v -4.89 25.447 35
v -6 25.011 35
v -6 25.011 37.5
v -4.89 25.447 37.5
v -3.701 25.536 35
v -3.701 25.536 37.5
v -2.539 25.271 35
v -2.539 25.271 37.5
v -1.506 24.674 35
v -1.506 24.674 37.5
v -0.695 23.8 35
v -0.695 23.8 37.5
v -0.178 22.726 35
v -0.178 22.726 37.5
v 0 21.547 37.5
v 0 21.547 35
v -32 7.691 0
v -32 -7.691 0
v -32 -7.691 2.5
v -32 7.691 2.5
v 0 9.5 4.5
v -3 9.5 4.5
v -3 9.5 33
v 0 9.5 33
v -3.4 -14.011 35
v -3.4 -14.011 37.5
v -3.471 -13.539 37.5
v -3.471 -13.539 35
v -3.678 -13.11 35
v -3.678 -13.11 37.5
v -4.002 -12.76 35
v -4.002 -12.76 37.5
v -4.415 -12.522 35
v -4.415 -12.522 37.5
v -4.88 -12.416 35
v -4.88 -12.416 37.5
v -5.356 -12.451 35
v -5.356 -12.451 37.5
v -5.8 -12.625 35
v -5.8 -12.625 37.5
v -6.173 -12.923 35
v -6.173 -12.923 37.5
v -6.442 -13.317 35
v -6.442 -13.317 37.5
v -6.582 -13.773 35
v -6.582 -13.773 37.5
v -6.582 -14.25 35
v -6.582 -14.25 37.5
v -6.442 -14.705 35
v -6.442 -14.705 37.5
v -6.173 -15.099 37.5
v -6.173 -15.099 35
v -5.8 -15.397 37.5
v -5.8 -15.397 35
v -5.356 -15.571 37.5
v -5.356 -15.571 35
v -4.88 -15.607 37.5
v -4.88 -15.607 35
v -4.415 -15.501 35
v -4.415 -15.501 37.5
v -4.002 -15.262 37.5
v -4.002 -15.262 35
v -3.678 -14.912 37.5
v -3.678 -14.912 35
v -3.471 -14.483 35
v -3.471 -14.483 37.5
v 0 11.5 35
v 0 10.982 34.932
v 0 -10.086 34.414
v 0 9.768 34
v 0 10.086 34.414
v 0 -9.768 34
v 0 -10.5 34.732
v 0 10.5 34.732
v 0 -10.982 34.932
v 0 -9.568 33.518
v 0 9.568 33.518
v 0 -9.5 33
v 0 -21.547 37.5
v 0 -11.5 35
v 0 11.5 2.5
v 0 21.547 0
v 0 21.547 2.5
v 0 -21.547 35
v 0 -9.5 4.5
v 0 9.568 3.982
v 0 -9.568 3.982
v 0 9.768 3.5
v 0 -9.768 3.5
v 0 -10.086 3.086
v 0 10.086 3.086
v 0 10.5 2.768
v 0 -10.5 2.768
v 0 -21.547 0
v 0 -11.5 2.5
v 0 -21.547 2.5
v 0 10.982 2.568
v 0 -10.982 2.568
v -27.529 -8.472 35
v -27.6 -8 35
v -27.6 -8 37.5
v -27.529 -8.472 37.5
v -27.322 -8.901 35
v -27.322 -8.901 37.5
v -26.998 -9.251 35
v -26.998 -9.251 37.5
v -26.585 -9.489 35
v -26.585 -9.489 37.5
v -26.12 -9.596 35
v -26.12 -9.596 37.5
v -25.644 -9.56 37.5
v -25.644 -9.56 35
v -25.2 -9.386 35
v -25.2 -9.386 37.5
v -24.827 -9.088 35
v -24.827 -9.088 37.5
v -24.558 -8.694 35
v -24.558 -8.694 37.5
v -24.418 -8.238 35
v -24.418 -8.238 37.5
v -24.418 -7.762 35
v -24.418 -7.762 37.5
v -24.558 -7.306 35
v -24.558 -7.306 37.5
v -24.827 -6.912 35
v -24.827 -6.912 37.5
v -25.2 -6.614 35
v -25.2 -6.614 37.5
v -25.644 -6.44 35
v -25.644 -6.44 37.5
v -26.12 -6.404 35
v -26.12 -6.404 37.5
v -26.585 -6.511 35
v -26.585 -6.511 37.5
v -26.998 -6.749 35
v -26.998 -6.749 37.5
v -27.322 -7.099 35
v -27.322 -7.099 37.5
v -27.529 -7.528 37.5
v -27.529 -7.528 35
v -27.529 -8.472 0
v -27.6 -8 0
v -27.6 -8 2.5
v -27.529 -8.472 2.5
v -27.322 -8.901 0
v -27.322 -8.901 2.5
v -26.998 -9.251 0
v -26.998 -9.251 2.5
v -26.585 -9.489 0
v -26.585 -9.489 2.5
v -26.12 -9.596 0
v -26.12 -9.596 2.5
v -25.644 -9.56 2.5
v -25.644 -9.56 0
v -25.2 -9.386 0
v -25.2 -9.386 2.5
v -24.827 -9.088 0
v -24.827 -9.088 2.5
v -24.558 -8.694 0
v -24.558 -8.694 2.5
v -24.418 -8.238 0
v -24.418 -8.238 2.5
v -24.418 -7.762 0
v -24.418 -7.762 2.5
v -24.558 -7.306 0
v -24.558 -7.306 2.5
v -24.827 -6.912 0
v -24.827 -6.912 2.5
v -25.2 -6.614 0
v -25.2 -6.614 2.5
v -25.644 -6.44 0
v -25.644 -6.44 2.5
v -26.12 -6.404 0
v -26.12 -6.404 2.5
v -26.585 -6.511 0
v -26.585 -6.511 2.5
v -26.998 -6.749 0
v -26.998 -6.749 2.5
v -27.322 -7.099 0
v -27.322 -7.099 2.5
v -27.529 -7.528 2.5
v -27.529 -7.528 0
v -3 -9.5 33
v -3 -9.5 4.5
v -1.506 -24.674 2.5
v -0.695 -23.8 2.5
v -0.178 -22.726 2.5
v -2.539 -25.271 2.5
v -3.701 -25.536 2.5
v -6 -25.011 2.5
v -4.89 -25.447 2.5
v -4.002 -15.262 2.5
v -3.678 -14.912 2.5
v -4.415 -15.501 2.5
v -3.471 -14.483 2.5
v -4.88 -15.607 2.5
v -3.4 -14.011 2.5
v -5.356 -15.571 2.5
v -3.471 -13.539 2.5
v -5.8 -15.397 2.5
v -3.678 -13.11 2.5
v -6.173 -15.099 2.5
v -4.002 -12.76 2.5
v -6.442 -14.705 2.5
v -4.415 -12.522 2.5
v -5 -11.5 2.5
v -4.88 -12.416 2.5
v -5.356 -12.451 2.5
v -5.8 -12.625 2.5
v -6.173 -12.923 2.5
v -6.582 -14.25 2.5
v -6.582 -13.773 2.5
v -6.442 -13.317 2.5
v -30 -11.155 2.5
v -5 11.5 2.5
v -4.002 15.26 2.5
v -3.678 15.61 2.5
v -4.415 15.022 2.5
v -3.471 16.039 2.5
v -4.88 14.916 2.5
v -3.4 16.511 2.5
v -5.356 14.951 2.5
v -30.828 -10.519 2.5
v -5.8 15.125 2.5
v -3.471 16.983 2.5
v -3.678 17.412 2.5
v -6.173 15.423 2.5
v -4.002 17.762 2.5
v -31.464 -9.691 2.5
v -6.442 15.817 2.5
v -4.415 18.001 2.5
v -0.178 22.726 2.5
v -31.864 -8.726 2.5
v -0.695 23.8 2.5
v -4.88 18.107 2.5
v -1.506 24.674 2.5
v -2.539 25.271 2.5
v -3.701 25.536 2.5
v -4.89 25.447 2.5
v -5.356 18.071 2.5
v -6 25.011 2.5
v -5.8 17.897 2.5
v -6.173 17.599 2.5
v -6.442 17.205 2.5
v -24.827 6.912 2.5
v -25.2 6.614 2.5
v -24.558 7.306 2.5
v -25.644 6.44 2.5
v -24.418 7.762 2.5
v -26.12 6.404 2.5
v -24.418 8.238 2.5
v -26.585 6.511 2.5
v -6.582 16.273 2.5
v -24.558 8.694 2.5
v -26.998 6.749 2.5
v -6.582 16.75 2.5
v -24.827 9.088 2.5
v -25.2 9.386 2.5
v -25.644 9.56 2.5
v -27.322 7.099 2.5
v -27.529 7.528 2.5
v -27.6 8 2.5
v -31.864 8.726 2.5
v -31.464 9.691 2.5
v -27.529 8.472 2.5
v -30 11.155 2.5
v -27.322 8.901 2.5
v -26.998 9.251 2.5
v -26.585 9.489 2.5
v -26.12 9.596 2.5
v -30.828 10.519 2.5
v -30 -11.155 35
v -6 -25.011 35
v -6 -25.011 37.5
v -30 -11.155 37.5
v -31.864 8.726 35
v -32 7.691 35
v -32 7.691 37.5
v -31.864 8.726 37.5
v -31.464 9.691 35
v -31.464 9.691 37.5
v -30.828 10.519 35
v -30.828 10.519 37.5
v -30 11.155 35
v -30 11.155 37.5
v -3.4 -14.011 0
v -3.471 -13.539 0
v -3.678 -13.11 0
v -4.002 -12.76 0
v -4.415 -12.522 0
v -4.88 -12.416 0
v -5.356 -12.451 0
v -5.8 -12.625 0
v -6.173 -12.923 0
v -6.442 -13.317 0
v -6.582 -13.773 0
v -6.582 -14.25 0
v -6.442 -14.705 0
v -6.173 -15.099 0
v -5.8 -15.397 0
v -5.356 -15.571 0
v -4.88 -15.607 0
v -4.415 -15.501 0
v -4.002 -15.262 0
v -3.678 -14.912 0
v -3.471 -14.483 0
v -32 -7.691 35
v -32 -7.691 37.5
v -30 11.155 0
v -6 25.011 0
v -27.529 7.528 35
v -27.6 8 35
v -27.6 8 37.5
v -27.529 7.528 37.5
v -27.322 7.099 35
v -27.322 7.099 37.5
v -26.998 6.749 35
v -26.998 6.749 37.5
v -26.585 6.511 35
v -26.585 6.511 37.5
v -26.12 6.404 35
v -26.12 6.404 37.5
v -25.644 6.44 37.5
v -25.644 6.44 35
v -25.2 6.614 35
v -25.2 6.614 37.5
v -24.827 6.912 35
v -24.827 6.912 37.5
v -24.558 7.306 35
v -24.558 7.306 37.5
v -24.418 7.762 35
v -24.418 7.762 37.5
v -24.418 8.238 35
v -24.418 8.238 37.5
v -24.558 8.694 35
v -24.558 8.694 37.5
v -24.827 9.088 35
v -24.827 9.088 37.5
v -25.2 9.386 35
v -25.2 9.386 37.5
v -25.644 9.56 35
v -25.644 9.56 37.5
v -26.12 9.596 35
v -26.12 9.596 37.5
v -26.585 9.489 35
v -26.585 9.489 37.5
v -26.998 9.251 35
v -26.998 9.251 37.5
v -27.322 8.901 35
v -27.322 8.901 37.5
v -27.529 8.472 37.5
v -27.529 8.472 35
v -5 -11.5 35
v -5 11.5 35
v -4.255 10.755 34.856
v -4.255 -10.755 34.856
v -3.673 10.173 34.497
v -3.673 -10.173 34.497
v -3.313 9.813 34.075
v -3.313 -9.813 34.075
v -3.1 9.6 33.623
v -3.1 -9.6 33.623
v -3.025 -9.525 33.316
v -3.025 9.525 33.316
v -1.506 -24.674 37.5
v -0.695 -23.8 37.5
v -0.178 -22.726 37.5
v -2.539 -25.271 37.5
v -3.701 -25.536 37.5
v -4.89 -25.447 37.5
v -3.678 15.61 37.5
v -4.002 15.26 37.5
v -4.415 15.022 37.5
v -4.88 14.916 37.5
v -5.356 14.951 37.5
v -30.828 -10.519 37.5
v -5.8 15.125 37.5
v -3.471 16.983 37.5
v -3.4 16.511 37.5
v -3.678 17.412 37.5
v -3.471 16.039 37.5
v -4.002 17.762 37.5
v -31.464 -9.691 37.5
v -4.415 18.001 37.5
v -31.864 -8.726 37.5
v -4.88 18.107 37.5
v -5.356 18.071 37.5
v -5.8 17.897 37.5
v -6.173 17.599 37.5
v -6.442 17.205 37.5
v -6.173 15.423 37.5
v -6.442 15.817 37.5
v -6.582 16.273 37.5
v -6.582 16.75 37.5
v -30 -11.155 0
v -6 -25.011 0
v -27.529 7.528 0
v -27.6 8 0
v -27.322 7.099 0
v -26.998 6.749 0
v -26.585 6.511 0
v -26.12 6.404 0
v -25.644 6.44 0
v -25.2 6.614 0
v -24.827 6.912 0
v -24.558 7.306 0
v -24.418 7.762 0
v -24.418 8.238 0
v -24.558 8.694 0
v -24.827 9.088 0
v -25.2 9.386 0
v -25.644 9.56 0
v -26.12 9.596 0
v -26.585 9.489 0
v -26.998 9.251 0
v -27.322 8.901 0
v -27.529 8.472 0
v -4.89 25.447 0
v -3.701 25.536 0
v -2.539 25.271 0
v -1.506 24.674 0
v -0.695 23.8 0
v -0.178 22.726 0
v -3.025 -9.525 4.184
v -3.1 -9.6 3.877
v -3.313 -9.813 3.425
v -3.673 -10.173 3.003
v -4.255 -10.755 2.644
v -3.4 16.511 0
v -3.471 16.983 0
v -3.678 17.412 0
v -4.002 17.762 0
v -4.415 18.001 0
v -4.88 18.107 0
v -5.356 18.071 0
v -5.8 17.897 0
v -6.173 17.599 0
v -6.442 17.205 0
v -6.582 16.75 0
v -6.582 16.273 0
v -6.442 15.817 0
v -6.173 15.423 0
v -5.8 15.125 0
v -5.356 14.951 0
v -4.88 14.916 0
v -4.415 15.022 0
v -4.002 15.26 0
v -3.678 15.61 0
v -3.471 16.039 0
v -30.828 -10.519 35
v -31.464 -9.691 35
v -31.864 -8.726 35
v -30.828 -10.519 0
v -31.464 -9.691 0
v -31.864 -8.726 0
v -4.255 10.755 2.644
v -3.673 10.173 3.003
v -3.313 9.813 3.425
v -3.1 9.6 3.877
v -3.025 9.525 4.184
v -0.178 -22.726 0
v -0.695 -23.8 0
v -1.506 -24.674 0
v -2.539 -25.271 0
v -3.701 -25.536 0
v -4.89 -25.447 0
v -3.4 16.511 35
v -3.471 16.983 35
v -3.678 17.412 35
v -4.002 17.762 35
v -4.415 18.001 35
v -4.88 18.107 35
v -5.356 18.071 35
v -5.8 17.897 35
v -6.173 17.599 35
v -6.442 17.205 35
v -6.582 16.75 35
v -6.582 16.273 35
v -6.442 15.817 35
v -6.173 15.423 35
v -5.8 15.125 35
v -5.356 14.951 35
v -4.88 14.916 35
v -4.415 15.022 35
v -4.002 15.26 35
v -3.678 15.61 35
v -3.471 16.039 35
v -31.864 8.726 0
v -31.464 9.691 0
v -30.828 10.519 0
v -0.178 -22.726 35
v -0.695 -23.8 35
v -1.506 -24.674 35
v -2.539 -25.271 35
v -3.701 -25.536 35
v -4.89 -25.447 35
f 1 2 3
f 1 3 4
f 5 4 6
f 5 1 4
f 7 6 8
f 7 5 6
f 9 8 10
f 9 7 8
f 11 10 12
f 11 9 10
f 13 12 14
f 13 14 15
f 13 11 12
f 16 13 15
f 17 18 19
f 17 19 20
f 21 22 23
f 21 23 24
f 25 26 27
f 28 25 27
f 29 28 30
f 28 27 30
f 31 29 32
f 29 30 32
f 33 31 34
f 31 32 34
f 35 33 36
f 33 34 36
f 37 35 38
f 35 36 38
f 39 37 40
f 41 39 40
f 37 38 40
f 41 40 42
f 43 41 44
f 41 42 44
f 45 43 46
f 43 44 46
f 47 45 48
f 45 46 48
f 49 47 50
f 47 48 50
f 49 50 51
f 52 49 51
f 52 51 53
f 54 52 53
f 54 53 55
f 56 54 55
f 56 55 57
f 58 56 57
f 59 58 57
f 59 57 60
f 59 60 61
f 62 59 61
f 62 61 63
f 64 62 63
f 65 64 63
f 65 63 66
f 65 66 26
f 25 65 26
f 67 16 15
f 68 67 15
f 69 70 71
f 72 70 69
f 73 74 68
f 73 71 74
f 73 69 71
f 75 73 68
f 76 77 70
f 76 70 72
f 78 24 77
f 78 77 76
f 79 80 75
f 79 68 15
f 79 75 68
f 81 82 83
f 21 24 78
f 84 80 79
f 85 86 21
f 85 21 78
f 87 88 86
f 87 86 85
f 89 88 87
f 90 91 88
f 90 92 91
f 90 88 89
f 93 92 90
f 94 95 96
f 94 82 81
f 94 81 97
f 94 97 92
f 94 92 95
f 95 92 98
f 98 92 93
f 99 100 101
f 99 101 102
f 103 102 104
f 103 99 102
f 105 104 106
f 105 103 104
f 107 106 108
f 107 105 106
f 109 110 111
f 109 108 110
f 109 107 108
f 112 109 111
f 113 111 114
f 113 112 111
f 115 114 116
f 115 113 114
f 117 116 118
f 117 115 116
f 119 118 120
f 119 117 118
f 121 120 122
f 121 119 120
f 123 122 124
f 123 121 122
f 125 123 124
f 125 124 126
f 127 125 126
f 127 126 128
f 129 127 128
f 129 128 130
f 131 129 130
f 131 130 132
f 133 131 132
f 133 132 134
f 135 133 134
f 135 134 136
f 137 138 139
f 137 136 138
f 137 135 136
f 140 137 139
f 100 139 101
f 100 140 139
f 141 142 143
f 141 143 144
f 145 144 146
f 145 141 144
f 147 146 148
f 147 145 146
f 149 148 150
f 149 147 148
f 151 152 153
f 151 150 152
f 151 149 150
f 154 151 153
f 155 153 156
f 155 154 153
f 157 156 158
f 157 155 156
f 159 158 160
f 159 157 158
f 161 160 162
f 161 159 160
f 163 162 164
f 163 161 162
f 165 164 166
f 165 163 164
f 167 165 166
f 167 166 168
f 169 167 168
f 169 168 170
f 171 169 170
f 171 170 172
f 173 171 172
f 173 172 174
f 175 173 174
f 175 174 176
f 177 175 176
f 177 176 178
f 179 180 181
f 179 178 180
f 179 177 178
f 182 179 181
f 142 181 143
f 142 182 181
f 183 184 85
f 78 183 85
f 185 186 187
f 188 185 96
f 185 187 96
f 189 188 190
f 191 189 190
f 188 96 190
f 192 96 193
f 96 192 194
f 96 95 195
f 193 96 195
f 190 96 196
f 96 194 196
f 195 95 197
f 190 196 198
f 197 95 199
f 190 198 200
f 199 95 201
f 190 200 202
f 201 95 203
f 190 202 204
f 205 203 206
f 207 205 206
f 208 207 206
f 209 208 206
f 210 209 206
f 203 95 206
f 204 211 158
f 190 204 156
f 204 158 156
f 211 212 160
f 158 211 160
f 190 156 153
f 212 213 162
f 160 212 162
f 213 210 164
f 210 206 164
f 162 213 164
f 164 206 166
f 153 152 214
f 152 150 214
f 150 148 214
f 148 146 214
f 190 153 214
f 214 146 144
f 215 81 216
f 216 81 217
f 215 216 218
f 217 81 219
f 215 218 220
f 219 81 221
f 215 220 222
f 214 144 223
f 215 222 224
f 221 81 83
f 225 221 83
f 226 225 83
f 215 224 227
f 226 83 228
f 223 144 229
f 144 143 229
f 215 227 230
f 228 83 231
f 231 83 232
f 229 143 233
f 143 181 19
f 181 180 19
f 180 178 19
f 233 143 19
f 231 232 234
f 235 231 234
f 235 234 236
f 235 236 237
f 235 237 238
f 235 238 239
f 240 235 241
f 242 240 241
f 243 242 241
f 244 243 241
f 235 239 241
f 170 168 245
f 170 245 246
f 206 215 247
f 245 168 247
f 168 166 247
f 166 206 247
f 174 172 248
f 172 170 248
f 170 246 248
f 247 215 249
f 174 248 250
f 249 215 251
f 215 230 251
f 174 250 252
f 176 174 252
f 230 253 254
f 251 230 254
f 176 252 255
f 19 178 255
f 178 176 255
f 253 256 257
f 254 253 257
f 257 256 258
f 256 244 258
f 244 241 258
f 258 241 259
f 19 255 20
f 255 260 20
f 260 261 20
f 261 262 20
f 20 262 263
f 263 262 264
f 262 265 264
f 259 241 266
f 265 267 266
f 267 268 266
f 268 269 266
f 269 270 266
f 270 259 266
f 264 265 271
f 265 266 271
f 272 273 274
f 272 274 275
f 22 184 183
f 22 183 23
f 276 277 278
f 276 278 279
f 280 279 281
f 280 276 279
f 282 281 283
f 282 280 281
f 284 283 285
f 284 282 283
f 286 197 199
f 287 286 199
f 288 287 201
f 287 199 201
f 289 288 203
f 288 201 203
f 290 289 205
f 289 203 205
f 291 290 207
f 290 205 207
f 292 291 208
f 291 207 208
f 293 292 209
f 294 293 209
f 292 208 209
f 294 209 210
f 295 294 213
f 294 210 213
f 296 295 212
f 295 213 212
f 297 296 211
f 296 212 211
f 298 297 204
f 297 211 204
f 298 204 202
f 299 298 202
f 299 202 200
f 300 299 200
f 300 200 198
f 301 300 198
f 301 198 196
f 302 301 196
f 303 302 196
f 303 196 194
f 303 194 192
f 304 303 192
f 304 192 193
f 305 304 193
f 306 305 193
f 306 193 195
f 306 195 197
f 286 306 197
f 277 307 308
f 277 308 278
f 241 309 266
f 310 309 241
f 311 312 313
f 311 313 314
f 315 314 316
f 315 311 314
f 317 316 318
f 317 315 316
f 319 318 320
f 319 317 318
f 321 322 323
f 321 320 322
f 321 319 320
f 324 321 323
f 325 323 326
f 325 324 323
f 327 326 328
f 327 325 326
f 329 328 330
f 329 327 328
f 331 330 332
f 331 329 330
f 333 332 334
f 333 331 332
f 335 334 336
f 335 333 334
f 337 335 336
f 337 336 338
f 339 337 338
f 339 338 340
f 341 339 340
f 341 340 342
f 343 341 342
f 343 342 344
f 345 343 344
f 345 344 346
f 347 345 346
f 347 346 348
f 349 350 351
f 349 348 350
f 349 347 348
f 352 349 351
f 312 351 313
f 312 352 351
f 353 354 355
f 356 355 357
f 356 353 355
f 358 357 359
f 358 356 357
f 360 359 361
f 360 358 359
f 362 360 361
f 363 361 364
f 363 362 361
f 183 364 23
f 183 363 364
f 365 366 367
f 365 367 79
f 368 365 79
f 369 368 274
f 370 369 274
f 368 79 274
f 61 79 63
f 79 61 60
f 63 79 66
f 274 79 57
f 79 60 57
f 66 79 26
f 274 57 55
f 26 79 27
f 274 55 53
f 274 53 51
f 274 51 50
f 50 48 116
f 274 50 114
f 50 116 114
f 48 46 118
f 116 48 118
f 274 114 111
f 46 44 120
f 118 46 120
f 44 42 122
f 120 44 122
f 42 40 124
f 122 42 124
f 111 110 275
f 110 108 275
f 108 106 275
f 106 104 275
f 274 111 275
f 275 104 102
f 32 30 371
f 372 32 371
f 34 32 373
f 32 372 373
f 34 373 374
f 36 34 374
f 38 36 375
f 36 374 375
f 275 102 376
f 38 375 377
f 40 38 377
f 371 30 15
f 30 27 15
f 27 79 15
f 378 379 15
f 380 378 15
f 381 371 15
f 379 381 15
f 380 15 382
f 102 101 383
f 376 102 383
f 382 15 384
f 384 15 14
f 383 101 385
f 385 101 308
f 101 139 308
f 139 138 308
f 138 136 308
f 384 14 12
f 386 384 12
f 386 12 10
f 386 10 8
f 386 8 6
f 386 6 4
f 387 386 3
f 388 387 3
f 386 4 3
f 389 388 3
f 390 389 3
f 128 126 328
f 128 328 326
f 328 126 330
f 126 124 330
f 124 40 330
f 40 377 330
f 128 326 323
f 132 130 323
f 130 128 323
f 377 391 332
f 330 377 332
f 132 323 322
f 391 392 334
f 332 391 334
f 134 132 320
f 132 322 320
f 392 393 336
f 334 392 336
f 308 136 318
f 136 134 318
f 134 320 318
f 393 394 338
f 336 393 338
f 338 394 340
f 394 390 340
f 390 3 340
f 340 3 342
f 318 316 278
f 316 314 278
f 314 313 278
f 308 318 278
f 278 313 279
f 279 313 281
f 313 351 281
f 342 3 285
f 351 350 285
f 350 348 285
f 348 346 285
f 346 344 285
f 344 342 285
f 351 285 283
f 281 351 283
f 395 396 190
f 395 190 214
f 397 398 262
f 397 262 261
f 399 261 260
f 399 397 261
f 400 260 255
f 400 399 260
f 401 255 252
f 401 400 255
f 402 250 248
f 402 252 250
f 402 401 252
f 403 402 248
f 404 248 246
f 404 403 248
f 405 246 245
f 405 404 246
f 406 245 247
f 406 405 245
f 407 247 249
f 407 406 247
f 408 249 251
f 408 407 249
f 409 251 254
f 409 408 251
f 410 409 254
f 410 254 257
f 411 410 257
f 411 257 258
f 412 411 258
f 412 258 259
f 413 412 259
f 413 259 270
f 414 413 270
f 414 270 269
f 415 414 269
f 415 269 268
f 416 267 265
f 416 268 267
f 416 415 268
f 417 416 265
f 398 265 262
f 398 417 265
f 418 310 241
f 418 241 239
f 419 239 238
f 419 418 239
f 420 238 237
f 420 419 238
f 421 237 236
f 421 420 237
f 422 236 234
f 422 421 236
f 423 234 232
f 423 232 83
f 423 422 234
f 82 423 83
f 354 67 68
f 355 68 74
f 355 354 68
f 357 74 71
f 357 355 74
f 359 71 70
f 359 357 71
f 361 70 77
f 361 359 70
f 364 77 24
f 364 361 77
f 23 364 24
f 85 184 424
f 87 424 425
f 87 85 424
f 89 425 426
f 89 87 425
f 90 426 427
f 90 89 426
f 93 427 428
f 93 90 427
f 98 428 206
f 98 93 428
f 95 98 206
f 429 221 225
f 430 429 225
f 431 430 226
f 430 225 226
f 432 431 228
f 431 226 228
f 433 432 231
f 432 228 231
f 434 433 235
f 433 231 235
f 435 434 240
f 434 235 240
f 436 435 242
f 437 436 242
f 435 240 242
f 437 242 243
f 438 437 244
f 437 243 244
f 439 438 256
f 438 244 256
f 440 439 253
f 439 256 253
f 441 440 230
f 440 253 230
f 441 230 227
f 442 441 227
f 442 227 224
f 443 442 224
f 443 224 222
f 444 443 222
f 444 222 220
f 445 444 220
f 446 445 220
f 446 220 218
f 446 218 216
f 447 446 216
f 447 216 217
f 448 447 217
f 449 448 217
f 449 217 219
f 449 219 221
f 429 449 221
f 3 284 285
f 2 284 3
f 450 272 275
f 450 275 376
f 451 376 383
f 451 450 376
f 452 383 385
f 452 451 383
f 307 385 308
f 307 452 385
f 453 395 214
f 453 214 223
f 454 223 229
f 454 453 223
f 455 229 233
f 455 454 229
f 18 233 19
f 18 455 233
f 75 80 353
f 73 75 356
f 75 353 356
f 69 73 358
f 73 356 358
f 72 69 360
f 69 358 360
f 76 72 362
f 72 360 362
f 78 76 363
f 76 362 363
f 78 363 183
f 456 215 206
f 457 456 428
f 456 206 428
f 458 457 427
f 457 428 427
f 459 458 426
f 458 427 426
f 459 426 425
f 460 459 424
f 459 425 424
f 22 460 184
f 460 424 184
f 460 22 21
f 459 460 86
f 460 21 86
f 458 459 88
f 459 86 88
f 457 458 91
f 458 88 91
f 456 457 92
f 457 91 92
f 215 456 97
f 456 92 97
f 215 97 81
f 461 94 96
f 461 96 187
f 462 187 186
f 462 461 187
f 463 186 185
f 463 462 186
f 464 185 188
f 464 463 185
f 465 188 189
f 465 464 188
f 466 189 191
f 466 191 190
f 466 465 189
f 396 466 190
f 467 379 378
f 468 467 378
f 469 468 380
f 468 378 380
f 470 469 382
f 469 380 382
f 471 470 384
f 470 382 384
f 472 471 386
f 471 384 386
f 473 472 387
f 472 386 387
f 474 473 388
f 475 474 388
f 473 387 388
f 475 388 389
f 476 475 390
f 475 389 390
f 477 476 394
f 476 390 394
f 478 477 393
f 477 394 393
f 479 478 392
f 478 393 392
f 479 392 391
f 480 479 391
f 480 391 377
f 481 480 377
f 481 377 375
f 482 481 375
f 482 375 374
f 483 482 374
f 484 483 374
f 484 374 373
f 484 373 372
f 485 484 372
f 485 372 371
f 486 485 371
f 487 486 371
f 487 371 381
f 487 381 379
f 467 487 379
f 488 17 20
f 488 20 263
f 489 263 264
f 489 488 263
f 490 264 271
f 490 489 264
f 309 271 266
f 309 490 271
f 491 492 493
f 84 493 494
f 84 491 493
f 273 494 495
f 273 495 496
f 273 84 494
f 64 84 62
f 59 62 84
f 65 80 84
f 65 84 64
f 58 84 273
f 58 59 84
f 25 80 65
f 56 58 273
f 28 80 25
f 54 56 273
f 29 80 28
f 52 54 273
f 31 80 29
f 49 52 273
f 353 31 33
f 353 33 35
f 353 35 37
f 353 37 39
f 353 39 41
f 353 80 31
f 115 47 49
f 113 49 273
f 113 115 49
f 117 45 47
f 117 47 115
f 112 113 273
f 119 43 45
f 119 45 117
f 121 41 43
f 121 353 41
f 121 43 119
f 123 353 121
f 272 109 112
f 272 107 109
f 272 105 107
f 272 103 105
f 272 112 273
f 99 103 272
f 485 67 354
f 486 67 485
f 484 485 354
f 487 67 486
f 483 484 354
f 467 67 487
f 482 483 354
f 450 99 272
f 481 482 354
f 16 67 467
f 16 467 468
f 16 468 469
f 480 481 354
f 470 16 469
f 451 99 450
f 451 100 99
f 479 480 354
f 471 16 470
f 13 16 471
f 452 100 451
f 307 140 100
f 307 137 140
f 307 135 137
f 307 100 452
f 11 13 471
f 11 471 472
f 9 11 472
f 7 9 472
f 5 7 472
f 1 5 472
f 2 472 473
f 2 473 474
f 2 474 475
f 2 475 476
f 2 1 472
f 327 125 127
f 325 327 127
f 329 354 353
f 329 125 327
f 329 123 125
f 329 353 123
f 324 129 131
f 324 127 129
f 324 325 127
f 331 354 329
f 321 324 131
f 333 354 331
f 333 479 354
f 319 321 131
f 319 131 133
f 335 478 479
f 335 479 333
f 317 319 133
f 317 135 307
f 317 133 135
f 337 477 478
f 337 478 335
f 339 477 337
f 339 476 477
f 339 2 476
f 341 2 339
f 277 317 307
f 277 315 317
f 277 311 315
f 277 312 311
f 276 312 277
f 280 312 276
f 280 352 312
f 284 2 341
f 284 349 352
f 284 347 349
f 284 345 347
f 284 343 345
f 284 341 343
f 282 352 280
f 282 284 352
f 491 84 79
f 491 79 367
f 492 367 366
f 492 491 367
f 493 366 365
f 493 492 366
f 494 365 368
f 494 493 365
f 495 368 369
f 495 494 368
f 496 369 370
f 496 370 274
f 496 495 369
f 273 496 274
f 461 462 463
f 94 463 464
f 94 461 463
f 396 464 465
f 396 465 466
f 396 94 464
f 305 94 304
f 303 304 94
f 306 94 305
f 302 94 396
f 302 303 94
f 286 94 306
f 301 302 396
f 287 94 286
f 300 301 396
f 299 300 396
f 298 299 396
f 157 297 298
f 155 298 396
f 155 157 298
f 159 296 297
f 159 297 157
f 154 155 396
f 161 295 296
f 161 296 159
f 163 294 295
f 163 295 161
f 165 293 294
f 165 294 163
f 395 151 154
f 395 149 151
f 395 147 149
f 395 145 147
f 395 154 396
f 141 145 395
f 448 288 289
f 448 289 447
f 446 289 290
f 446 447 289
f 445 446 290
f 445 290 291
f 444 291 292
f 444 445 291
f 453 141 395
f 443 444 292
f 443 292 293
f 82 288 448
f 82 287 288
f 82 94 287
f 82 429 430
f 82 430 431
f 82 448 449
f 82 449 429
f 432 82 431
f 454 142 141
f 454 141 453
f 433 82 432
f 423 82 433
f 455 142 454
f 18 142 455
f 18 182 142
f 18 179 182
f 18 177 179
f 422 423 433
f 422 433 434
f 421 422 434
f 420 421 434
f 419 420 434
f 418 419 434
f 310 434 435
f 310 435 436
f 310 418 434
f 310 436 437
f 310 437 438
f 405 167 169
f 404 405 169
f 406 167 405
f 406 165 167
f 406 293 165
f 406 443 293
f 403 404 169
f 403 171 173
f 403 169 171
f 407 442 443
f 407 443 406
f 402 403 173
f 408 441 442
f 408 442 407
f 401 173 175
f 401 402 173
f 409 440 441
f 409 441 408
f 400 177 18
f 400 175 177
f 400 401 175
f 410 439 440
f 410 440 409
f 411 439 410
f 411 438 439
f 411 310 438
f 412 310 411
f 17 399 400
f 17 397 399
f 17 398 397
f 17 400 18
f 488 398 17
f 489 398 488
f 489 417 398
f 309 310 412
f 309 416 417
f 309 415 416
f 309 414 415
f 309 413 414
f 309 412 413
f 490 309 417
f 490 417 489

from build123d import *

# Parameters (mm, degrees)
BOSS_EXTRUDE1_DEPTH     = 2.5
SKETCH3_W               = 3
SKETCH3_H               = 19
BOSS_EXTRUDE2_DEPTH     = 35
LPATTERN1_COUNT         = 2
LPATTERN1_PITCH         = 35
CUT_EXTRUDE2_DEPTH      = 54.866960969
CUT_EXTRUDE2_DEPTH_BACK = 10
SKETCH6_R               = 1.6
SKETCH8_R               = 1.6
CUT_EXTRUDE4_DEPTH      = 56.523864095
FILLET1_R               = 2
FILLET2_R               = 2


with BuildPart() as part:
    # Sketch2 → Boss-Extrude1 (new body)
    with BuildSketch(Plane.XY):
        with BuildLine():
            Line((-32, -7.690598923), (-32, 7.690598923))
            ThreePointArc((-32, 7.690598923), (-31.464101615, 9.690598923), (-30, 11.154700538))
            Line((-30, 11.154700538), (-6, 25.011106999))
            ThreePointArc((-6, 25.011106999), (-2, 25.011106999), (0, 21.547005384))
            Line((0, 21.547005384), (0, -21.547005384))
            ThreePointArc((0, -21.547005384), (-2, -25.011106999), (-6, -25.011106999))
            Line((-6, -25.011106999), (-30, -11.154700538))
            ThreePointArc((-30, -11.154700538), (-31.464101615, -9.690598923), (-32, -7.690598923))
        make_face()
    boss_extrude1 = extrude(amount=BOSS_EXTRUDE1_DEPTH)

    # Sketch3 → Boss-Extrude2 (add)
    with BuildSketch(Plane.XY.offset(2.5)):
        with Locations((-1.5, 0)):
            Rectangle(SKETCH3_W, SKETCH3_H)
    extrude(amount=BOSS_EXTRUDE2_DEPTH)

    # LPattern1: Boss-Extrude1 ×2
    with Locations(*[(0, 0, i * LPATTERN1_PITCH) for i in range(1, LPATTERN1_COUNT)]):
        add(boss_extrude1)

    # Sketch6 → Cut-Extrude2 (cut, two sides: drawn at the far end of the back side and taken through both)
    with BuildSketch(Plane.XY.offset(2.5).offset(-CUT_EXTRUDE2_DEPTH_BACK)):
        with Locations(Location((-26, 8, 0), (0, 0, 180))):
            Circle(SKETCH6_R)
        with Locations(Location((-26, -8, 0), (0, 0, 180))):
            Circle(SKETCH6_R)
    extrude(amount=CUT_EXTRUDE2_DEPTH + CUT_EXTRUDE2_DEPTH_BACK, mode=Mode.SUBTRACT)

    # Sketch8 → Cut-Extrude4 (cut, through all)
    with BuildSketch(Plane.XY.offset(37.5)):
        with Locations((-5, 16.511106999)):
            Circle(SKETCH8_R)
        with Locations((-5, -14.011106999)):
            Circle(SKETCH8_R)
    extrude(amount=-CUT_EXTRUDE4_DEPTH, mode=Mode.SUBTRACT)

    # Fillet1
    fillet1_edges = [part.edges().sort_by_distance(p)[0] for p in [
        (-1.5, 9.5, 2.5),
        (-1.5, -9.5, 2.5),
        (-1.5, -9.5, 35),
        (-1.5, 9.5, 35),
    ]]
    fillet(fillet1_edges, radius=FILLET1_R)

    # Fillet2
    fillet2_edges = [part.edges().sort_by_distance(p)[0] for p in [
        (-3, 0, 2.5),
        (-3, 0, 35),
    ]]
    fillet(fillet2_edges, radius=FILLET2_R)


solid = part.part
